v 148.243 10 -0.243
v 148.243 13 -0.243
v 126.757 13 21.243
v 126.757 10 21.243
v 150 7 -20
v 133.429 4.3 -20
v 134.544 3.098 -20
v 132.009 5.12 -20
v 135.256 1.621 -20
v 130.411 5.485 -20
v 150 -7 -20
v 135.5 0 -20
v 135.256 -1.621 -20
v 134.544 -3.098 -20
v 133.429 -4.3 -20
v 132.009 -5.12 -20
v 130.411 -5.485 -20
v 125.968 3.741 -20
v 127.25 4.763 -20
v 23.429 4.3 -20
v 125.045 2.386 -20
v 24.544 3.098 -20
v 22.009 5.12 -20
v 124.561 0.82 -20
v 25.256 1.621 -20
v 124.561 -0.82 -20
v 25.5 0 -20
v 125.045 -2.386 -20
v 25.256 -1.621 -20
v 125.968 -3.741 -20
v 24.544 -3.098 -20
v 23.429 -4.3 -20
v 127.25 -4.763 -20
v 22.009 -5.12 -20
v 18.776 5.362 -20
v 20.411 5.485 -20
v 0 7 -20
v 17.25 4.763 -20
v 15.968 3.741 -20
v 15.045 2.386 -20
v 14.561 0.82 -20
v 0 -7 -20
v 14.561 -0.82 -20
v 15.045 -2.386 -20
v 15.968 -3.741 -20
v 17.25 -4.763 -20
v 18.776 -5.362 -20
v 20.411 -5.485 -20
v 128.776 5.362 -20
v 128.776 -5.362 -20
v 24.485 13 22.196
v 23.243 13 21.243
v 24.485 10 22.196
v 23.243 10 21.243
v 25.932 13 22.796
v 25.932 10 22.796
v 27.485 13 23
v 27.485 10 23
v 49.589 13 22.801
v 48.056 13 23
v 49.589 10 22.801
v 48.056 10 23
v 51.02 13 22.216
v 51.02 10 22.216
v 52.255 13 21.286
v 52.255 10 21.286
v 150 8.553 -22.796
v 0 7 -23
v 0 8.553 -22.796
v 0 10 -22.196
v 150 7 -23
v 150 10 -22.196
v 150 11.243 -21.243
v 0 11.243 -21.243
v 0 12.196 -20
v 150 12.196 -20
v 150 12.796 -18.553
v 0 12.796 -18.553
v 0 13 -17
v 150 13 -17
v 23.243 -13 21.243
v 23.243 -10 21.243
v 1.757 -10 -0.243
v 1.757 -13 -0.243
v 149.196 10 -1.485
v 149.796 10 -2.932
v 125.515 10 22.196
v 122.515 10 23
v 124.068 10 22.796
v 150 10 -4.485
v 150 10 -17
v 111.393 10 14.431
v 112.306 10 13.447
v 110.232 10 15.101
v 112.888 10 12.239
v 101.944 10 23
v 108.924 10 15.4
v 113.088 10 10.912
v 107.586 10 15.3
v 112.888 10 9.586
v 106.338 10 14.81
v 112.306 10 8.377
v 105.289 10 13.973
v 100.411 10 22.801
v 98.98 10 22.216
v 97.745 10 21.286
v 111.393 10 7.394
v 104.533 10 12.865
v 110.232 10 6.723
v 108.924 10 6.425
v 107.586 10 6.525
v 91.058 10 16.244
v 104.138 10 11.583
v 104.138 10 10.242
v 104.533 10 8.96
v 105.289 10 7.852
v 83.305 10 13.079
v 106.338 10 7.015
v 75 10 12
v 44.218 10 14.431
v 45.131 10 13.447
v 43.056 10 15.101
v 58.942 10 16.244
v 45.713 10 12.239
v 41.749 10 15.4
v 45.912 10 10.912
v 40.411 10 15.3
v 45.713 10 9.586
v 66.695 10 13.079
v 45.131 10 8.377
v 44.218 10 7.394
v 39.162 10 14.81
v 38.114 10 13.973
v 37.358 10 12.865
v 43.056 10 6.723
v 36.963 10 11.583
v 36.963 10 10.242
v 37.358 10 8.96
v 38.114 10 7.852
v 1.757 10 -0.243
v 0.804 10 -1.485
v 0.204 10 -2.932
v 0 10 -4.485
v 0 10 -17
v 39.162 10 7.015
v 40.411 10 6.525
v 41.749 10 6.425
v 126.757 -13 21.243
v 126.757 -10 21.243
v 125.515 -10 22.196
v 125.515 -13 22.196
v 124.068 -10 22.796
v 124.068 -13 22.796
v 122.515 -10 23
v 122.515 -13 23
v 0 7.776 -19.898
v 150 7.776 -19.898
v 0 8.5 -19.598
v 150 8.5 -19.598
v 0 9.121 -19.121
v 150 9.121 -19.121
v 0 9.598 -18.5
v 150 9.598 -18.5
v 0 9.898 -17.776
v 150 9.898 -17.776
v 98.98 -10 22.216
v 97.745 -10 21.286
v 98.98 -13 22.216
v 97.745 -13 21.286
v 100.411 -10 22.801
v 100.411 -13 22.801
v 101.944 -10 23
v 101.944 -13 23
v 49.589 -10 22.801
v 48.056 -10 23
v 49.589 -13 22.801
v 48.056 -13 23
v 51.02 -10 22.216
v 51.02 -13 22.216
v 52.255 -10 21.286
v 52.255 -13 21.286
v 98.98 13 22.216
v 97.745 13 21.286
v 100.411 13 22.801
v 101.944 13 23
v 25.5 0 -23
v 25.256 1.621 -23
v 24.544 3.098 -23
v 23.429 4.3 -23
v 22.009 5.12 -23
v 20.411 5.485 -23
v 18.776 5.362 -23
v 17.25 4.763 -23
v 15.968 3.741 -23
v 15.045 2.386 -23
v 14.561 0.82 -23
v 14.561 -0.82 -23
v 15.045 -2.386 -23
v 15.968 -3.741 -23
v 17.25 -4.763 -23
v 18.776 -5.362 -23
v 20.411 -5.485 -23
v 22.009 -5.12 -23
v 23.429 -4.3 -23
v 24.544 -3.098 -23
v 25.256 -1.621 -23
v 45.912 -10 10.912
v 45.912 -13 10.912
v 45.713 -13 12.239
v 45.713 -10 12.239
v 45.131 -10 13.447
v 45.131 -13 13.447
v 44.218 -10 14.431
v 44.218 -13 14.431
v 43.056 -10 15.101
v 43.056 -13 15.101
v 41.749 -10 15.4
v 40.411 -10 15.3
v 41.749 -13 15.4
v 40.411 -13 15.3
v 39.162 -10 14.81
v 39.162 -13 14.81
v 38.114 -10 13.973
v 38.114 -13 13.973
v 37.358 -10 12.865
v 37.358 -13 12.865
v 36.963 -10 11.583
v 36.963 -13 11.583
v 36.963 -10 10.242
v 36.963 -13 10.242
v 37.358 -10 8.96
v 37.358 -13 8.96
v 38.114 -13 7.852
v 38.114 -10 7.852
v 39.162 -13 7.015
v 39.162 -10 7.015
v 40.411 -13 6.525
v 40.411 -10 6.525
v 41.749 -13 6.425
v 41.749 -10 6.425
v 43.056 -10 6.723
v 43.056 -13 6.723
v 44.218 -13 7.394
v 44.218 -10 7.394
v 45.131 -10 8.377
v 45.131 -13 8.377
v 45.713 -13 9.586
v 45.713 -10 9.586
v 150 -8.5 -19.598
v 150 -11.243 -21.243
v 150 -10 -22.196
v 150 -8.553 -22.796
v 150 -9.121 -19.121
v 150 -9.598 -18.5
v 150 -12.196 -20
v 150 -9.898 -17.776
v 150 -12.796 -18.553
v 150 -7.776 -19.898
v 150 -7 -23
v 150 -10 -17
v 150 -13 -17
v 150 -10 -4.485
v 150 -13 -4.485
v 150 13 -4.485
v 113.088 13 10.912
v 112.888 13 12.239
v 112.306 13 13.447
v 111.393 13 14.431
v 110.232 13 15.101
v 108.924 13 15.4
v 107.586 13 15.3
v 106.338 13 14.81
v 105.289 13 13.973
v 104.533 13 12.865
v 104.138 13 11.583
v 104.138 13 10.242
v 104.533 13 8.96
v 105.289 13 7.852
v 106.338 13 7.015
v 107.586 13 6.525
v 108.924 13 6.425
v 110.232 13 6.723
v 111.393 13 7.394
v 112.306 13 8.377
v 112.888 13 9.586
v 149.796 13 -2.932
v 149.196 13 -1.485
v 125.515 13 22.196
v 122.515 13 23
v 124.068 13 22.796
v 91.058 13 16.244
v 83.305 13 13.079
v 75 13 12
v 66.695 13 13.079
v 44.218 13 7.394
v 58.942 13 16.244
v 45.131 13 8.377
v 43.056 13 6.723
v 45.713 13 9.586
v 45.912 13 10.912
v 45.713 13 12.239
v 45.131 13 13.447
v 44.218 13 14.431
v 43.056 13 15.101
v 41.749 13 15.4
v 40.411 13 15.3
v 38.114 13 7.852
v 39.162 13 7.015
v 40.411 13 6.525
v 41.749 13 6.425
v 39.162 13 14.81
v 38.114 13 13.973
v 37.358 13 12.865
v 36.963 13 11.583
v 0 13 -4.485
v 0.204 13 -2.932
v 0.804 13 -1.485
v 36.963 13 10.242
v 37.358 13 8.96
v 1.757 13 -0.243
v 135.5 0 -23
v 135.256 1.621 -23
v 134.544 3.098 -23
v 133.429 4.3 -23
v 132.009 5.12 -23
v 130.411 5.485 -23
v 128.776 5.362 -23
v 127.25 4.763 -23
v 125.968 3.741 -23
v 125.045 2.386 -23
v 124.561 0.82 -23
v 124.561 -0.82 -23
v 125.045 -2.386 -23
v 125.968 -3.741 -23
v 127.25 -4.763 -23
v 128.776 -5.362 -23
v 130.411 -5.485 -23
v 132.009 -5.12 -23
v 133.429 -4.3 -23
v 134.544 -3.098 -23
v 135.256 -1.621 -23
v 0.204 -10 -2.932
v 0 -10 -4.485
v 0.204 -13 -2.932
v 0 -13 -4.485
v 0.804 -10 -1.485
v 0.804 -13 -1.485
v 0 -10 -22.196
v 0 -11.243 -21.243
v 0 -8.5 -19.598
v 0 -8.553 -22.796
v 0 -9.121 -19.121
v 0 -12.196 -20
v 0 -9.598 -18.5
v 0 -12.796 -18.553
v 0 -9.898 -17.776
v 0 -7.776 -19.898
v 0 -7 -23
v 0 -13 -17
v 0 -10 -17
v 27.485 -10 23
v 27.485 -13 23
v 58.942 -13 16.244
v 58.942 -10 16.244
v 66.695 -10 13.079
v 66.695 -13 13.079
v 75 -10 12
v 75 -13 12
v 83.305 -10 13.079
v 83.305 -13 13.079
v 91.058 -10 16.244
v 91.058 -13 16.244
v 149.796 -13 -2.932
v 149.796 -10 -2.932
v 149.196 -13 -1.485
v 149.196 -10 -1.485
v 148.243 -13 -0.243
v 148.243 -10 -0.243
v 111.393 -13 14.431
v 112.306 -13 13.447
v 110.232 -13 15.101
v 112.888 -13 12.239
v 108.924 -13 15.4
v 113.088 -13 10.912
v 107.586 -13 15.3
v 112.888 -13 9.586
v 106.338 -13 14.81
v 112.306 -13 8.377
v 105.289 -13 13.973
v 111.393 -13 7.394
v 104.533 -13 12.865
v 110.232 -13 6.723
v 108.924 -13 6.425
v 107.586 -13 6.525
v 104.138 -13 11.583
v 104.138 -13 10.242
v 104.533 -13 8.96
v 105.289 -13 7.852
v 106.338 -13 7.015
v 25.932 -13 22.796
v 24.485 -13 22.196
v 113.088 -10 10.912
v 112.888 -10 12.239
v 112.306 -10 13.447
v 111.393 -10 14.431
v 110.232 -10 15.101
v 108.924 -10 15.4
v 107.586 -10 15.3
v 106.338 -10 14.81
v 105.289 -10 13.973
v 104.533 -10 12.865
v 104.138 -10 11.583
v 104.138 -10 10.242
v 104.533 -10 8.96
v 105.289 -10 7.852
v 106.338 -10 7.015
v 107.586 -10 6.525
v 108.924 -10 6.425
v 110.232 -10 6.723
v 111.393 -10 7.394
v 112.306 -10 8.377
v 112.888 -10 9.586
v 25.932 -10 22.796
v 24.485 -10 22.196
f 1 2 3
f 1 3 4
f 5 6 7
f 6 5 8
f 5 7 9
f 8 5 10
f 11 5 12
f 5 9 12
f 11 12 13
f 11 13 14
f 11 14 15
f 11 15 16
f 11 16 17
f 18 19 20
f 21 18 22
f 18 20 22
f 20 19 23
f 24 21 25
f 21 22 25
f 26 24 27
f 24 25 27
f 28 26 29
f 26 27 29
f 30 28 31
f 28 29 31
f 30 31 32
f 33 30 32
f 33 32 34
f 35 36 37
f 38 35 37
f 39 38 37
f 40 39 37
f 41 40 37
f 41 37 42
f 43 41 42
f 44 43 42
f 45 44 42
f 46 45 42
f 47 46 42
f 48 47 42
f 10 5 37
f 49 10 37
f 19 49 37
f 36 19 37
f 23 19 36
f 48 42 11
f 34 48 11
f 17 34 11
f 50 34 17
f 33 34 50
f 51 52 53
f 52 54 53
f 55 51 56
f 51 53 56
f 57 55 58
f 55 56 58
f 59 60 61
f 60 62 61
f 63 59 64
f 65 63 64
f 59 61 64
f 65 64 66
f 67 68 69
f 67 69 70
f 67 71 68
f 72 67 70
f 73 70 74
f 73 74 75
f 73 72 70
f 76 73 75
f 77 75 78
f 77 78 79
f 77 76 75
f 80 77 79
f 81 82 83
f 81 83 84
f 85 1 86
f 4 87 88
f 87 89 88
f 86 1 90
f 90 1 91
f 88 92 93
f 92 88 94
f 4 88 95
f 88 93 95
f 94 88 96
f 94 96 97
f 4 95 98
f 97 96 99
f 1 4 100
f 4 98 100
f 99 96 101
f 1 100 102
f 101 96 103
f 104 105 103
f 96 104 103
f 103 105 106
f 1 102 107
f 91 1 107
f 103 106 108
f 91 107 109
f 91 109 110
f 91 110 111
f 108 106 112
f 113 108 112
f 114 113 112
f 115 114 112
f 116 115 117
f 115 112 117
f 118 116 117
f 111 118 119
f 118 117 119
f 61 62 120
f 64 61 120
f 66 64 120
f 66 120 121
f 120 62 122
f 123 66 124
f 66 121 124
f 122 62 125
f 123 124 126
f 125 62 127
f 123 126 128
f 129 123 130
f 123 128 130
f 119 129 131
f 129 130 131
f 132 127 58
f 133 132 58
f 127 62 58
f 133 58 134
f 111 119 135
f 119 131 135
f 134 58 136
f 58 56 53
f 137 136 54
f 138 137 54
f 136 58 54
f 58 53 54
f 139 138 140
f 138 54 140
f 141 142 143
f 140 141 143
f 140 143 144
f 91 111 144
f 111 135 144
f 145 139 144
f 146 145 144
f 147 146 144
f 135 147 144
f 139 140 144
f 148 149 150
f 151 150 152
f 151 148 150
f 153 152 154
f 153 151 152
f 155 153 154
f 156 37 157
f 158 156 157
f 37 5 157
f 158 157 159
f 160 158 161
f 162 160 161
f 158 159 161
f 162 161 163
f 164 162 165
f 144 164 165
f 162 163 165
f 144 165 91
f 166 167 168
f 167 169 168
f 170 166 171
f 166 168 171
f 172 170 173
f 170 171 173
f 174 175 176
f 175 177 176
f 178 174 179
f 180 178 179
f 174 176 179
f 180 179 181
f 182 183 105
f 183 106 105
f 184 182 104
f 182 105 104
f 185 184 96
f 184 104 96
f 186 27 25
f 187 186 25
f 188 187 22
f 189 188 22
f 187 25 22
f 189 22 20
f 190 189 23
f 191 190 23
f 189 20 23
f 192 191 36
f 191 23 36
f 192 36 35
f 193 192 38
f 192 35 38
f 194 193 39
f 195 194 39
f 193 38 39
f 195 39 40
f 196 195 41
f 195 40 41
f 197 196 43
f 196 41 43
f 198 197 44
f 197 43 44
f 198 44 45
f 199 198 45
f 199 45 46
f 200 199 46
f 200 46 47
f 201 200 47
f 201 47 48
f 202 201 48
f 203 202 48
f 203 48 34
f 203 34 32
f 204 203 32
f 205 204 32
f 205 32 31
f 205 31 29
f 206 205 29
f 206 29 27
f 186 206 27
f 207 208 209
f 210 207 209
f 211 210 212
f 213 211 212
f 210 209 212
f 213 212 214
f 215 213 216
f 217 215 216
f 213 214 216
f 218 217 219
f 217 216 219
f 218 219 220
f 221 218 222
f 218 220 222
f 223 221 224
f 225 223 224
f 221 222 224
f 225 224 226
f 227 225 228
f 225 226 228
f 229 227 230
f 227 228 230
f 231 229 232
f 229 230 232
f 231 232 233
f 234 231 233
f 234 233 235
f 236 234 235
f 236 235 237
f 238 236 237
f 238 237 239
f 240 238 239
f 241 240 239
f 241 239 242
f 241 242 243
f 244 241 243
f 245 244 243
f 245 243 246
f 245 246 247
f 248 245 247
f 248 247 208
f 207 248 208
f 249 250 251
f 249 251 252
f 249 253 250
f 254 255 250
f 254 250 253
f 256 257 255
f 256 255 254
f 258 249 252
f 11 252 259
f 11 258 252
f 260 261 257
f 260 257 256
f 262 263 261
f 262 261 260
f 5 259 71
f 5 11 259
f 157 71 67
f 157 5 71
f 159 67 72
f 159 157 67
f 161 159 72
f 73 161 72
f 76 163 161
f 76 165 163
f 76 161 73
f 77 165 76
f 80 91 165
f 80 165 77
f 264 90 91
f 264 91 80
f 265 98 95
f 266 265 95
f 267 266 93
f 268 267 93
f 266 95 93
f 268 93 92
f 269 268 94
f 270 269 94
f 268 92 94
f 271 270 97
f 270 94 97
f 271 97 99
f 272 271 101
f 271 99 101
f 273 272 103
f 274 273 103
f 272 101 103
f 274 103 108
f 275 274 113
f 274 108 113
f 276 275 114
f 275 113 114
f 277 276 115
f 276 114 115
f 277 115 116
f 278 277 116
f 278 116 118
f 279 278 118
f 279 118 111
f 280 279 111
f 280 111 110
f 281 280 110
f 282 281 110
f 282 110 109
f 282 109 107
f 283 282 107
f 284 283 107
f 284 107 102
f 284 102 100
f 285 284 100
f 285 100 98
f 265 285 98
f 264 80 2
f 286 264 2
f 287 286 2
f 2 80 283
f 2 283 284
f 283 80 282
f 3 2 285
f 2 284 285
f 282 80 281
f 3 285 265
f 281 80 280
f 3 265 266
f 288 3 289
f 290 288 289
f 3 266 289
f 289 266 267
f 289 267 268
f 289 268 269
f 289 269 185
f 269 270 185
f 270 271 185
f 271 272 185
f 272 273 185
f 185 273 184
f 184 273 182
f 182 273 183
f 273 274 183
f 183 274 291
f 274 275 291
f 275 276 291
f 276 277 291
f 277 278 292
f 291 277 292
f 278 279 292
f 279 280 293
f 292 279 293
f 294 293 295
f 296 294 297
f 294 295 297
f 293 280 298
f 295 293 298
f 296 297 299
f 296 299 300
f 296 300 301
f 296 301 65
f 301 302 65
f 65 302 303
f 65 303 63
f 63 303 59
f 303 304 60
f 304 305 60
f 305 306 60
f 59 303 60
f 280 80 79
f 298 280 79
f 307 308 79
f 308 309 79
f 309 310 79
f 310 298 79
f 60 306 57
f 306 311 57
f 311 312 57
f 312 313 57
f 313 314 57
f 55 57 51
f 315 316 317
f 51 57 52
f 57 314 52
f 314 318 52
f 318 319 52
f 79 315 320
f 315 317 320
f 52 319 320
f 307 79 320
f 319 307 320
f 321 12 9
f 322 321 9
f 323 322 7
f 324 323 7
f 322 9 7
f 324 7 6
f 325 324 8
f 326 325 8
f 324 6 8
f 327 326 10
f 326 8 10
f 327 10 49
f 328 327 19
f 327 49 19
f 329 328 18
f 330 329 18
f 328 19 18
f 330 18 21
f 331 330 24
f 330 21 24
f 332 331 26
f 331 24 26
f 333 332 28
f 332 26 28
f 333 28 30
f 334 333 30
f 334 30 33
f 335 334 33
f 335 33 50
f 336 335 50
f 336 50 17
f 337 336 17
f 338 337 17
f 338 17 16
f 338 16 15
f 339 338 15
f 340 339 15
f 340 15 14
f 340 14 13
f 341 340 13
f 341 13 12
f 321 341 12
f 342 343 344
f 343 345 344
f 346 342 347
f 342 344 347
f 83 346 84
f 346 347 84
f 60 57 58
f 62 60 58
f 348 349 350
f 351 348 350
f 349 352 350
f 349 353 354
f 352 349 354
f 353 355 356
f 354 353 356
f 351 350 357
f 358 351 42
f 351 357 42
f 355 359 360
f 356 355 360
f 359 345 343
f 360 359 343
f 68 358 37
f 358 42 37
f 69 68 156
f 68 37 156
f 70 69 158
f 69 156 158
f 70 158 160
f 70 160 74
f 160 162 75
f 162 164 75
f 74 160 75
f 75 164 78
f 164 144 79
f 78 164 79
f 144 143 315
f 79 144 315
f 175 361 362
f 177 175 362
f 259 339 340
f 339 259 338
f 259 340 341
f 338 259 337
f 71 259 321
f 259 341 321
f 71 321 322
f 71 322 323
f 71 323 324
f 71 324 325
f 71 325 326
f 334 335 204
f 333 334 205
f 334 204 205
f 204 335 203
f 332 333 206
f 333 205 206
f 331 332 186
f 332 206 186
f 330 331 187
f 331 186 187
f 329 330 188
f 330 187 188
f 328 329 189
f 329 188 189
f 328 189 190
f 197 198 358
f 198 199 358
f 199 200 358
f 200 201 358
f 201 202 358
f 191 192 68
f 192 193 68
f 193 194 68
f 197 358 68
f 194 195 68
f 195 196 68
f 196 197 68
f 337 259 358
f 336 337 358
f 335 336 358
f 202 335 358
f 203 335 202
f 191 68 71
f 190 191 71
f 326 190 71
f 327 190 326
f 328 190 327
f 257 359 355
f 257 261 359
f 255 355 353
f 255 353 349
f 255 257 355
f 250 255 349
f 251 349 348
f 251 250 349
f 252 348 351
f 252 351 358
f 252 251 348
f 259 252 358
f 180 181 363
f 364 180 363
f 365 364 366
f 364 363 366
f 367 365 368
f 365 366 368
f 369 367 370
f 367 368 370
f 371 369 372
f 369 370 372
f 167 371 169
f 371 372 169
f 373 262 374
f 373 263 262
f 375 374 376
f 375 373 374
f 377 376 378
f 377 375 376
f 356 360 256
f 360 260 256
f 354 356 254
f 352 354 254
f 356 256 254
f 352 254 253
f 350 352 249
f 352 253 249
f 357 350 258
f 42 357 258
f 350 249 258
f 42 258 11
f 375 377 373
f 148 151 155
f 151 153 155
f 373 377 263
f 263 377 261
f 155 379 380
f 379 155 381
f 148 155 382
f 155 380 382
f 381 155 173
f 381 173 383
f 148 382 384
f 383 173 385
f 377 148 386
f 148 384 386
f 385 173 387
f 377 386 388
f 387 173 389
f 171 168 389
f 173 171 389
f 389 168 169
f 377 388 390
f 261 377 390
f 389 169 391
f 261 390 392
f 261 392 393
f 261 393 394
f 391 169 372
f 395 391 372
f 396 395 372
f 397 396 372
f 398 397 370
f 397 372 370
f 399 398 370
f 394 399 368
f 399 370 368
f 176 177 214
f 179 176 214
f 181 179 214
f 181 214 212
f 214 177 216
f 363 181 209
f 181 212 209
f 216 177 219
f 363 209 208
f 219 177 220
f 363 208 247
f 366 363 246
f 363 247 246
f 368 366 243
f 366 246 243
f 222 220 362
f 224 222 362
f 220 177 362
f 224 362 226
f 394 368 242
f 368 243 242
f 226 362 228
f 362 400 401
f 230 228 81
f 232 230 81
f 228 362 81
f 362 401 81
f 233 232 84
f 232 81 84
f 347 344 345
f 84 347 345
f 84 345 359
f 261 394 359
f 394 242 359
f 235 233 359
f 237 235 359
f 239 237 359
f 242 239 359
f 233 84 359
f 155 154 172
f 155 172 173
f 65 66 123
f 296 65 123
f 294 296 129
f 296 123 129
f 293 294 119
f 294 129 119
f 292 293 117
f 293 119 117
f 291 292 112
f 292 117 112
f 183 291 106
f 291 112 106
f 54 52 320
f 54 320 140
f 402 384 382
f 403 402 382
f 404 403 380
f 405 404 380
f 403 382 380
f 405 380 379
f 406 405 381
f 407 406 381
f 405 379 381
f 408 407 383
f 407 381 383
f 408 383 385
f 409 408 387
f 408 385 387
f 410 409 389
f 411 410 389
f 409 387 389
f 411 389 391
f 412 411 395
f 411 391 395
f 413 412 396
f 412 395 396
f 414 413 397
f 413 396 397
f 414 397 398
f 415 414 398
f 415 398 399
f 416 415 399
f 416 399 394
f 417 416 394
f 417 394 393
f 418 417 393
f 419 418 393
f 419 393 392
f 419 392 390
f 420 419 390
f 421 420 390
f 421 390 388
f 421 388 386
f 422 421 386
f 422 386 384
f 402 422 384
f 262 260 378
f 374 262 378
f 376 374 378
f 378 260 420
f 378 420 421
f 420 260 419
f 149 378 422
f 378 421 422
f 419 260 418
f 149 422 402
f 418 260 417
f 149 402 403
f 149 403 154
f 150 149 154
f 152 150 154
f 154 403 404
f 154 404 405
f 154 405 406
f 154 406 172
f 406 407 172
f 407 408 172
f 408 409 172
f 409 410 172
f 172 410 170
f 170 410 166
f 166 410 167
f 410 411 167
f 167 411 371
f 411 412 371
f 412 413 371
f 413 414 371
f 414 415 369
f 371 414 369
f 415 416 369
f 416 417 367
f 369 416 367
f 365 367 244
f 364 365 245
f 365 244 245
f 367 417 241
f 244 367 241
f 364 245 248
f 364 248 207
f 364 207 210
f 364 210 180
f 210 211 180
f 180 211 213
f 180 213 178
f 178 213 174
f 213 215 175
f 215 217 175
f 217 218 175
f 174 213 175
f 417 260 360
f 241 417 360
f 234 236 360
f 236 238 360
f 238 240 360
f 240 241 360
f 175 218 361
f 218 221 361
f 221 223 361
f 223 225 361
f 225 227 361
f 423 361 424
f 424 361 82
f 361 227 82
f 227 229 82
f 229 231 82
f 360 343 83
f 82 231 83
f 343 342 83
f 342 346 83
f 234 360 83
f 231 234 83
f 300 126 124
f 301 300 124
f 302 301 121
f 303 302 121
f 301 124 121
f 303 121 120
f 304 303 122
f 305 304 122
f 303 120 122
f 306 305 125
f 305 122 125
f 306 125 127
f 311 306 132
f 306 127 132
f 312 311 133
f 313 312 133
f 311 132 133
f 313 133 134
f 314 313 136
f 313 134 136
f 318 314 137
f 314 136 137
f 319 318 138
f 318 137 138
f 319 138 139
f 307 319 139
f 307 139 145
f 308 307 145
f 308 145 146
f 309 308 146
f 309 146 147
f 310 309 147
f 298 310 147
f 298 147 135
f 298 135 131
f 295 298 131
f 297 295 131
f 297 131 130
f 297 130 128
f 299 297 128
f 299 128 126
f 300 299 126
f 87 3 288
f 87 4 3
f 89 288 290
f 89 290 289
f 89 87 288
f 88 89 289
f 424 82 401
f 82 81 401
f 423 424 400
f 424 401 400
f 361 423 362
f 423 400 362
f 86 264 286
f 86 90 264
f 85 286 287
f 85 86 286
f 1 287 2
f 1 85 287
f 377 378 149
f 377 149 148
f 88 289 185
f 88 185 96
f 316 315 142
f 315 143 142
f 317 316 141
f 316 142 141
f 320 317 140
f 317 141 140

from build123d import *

# Parameters (mm, degrees)
F1_DEPTH = 150
F2_R     = 32.5
F2_R_2   = 4.5
F3_DEPTH = 50
F4_R     = 5.5
F5_DEPTH = 25
F6_SIZE  = 25
F7_R     = 6
F8_DEPTH = 25
F9_R     = 3


with BuildPart() as f1:
    # F0 (on Right) → F1 (new body)
    with BuildSketch(Plane.YZ):
        Polygon((-13, -23), (13, -23), (13, 23), (10, 23), (10, -20), (-10, -20), (-10, 23), (-13, 23), align=None)
    extrude(amount=F1_DEPTH)

    # F2 (on face) → F3 (cut)
    with BuildSketch(Plane.XZ.offset(13)):
        with Locations((75, 44.5)):
            Circle(F2_R)
        with Locations((108.5875721064, 10.9124278936)):
            Circle(F2_R_2)
        with Locations((41.4124278936, 10.9124278936)):
            Circle(F2_R_2)
    extrude(amount=-F3_DEPTH, mode=Mode.SUBTRACT)

    # F4 (on face) → F5 (cut)
    with BuildSketch(Plane.XY.offset(-20)):
        with Locations((20, 0)):
            Circle(F4_R)
        with Locations((130, 0)):
            Circle(F4_R)
    extrude(amount=-F5_DEPTH, mode=Mode.SUBTRACT)

    # F6
    f6_edges = [f1.edges().sort_by_distance(p)[0] for p in [
        (0, 11.5, 23),
        (0, -11.5, 23),
        (150, -11.5, 23),
        (150, 11.5, 23),
    ]]
    chamfer(f6_edges, length=F6_SIZE)

    # F7
    f7_edges = [f1.edges().sort_by_distance(p)[0] for p in [
        (0, -11.5, -2),
        (0, 11.5, -2),
        (25, 11.5, 23),
        (25, -11.5, 23),
        (99.372115, -11.5, 23),
        (50.627885, -11.5, 23),
        (50.627885, 11.5, 23),
        (99.372115, 11.5, 23),
        (125, -11.5, 23),
        (125, 11.5, 23),
        (150, 11.5, -2),
        (150, -11.5, -2),
        (75, -13, -23),
        (75, 13, -23),
    ]]
    fillet(f7_edges, radius=F7_R)

    # F2 (on face) → F8 (cut)
    with BuildSketch(Plane.XZ.offset(13)):
        with Locations((75, 44.5)):
            Circle(F2_R)
        with Locations((108.5875721064, 10.9124278936)):
            Circle(F2_R_2)
        with Locations((41.4124278936, 10.9124278936)):
            Circle(F2_R_2)
    extrude(amount=-F8_DEPTH, mode=Mode.SUBTRACT)

    # F9
    f9_edges = [f1.edges().sort_by_distance(p)[0] for p in [
        (75, 10, -20),
        (75, -10, -20),
    ]]
    fillet(f9_edges, radius=F9_R)


solid = f1.part
